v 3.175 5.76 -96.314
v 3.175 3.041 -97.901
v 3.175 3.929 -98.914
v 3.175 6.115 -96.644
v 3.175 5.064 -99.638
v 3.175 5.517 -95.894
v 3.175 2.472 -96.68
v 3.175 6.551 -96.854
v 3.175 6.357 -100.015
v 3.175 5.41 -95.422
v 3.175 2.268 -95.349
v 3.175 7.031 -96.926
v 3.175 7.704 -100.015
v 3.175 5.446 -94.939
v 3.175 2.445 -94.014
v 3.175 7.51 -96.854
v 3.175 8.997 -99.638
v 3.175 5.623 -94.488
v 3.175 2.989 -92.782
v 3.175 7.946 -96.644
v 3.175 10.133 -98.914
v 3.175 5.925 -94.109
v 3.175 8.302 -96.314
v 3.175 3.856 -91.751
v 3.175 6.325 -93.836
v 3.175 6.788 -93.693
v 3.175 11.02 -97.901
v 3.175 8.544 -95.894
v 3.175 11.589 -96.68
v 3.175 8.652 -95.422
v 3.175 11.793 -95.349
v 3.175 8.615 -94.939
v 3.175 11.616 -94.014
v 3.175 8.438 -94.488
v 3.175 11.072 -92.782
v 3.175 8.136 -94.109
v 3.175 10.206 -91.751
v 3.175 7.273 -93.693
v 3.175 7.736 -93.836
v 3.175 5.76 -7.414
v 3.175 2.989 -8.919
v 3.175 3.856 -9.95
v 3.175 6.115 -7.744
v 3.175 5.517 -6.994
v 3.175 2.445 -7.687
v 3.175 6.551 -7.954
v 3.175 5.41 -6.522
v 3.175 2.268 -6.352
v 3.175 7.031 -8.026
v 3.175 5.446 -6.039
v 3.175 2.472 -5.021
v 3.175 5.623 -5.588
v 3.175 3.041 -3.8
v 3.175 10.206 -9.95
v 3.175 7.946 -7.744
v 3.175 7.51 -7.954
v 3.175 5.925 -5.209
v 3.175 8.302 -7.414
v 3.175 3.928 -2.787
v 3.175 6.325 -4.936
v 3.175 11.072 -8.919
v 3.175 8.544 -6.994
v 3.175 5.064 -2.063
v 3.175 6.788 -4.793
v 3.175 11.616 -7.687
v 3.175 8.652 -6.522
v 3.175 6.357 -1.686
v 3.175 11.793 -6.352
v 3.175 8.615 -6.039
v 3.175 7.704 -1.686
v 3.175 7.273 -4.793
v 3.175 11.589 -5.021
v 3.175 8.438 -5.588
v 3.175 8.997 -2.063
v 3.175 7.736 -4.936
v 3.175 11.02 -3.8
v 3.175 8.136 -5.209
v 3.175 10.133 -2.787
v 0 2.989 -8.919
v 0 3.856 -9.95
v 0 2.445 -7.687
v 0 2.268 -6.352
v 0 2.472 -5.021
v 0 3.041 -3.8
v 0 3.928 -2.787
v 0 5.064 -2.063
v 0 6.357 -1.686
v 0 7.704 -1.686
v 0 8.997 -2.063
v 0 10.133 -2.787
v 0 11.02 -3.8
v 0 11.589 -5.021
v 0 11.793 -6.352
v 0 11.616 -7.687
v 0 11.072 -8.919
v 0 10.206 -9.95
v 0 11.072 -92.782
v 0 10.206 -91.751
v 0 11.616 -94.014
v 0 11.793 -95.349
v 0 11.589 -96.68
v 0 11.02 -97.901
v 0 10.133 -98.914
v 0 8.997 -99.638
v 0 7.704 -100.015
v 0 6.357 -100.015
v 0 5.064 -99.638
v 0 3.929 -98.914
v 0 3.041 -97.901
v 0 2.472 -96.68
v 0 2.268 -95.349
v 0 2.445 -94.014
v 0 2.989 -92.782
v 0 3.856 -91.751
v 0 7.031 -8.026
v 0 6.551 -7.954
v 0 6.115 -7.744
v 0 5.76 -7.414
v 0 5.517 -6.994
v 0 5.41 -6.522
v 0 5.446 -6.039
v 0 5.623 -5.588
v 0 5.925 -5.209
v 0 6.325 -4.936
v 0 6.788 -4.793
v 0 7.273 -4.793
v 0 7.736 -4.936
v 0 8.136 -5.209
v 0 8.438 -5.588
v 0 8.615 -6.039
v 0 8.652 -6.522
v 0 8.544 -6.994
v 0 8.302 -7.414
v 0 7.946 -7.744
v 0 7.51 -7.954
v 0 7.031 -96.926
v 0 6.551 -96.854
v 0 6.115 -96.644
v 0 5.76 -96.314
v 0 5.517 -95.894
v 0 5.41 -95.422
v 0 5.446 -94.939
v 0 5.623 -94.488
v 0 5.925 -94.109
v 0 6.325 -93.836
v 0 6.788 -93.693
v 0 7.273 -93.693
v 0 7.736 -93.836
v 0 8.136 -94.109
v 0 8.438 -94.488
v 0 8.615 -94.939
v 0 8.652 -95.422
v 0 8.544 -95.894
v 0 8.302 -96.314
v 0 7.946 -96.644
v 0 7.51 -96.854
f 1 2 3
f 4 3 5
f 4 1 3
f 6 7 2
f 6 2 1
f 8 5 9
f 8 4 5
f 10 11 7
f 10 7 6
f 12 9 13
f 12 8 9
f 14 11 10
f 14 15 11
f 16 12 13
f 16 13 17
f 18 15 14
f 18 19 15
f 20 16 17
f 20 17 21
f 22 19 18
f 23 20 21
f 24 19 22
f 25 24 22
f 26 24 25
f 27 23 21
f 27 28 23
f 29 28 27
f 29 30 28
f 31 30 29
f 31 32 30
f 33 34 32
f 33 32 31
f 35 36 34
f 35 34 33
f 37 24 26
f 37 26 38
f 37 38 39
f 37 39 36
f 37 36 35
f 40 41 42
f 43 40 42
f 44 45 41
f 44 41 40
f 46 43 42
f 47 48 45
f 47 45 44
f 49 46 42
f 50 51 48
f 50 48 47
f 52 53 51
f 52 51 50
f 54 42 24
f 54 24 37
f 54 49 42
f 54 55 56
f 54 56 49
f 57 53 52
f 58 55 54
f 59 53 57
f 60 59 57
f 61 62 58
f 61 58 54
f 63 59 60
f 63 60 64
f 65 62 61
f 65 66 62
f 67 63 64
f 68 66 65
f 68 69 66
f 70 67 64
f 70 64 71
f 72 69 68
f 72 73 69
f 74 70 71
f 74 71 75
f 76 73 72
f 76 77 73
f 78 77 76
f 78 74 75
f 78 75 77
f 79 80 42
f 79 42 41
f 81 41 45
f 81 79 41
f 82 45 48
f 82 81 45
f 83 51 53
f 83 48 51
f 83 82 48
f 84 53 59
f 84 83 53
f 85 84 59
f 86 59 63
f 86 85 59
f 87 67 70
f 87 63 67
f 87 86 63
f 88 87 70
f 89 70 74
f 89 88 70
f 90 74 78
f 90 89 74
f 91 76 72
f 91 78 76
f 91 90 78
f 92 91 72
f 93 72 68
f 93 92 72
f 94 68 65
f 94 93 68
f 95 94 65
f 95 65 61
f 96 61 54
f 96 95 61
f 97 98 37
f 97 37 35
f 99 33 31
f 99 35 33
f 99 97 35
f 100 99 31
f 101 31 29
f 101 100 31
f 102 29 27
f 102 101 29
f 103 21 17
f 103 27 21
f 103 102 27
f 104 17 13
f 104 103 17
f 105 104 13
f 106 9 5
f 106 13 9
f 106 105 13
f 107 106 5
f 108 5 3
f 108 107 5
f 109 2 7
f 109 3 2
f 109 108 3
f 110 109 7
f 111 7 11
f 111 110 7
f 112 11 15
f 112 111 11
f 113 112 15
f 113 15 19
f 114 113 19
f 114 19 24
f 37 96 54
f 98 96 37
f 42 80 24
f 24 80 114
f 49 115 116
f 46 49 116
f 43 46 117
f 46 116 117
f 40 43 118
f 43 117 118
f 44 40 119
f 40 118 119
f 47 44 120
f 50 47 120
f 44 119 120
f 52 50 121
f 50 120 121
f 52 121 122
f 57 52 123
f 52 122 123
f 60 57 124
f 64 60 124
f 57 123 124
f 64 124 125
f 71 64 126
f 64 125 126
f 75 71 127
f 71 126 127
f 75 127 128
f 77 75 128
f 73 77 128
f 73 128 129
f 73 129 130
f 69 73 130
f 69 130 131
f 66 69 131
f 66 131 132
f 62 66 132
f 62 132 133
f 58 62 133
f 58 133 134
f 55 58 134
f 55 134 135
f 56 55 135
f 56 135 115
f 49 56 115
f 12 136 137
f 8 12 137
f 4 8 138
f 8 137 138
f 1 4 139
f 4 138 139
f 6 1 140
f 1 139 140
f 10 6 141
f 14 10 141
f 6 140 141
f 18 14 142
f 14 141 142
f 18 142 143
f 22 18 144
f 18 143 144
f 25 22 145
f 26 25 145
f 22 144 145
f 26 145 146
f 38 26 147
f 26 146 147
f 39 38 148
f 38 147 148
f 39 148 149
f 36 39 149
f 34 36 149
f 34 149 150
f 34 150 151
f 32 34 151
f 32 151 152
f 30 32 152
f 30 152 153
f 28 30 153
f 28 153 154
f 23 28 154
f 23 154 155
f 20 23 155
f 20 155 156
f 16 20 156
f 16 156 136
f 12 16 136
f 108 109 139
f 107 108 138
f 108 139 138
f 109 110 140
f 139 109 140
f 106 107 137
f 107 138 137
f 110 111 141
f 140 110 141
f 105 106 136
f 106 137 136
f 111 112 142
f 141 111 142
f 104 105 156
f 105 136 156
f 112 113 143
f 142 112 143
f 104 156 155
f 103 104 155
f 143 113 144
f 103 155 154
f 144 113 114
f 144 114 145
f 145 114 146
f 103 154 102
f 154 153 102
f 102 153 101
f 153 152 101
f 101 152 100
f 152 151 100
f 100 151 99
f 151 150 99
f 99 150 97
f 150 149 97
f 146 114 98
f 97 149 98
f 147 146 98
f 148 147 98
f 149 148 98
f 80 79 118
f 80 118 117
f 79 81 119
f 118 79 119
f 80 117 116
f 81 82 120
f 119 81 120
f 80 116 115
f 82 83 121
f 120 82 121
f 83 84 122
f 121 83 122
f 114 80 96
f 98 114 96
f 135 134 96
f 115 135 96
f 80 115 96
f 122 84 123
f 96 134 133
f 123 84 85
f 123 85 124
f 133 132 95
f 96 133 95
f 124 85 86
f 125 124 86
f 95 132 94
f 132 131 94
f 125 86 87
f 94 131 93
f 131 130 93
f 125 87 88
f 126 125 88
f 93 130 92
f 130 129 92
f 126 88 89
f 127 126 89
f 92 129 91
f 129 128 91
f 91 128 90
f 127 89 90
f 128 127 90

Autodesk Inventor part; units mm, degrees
ref_plane "YZ Plane" through (0, 0, 0) normal (1, 0, 0) x (0, 1, 0)
ref_plane "XZ Plane" through (0, 0, 0) normal (0, 1, 0) x (-1, 0, 0)
ref_plane "XY Plane" through (0, 0, 0) normal (0, 0, 1) x (1, 0, 0)
sketch "Sketch1" plane through (0, 0, 0) normal (1, 0, 0) x (0, 1, 0)
  line L0 (10.2056, -9.9502) -> (10.2056, -91.7507)
  arc A0 (10.2056, -9.9502) -> (3.8556, -9.9502) centre (7.0306, -6.4004) ccw
  arc A1 (3.8556, -91.7507) -> (10.2056, -91.7507) centre (7.0306, -95.3004) ccw
  line L1 (3.8556, -9.9502) -> (3.8556, -91.7507)
  point P0 (0, 0)
  dimension "d1" = 88.9
  dimension "d2" = 9.525
  dimension "d5" = 6.35
  dimension "d6" = 9.525
  dimension "d7" = 0
  dimension "d8" = 3.175
extrude "Extrusion1" add sketch "Sketch1" along normal blind 3.175
sketch "Sketch2" plane through (3.175, 0, 0) normal (1, 0, 0) x (0, 0, -1)
  arc A0 (9.9502, 10.2056) -> (9.9502, 3.8556) centre (6.4004, 7.0306) ccw projected
  arc A1 (91.7507, 3.8556) -> (91.7507, 10.2056) centre (95.3004, 7.0306) ccw projected
  point P0 (0, 0)
hole "Hole1" at (3.175, 7.0306, -6.4004) at (3.175, 7.0306, -95.3004) direction (-1, 0, 0) diameter 3.2512 depth 25.4 tip angle 118
properties part number "Linkage Arm"
